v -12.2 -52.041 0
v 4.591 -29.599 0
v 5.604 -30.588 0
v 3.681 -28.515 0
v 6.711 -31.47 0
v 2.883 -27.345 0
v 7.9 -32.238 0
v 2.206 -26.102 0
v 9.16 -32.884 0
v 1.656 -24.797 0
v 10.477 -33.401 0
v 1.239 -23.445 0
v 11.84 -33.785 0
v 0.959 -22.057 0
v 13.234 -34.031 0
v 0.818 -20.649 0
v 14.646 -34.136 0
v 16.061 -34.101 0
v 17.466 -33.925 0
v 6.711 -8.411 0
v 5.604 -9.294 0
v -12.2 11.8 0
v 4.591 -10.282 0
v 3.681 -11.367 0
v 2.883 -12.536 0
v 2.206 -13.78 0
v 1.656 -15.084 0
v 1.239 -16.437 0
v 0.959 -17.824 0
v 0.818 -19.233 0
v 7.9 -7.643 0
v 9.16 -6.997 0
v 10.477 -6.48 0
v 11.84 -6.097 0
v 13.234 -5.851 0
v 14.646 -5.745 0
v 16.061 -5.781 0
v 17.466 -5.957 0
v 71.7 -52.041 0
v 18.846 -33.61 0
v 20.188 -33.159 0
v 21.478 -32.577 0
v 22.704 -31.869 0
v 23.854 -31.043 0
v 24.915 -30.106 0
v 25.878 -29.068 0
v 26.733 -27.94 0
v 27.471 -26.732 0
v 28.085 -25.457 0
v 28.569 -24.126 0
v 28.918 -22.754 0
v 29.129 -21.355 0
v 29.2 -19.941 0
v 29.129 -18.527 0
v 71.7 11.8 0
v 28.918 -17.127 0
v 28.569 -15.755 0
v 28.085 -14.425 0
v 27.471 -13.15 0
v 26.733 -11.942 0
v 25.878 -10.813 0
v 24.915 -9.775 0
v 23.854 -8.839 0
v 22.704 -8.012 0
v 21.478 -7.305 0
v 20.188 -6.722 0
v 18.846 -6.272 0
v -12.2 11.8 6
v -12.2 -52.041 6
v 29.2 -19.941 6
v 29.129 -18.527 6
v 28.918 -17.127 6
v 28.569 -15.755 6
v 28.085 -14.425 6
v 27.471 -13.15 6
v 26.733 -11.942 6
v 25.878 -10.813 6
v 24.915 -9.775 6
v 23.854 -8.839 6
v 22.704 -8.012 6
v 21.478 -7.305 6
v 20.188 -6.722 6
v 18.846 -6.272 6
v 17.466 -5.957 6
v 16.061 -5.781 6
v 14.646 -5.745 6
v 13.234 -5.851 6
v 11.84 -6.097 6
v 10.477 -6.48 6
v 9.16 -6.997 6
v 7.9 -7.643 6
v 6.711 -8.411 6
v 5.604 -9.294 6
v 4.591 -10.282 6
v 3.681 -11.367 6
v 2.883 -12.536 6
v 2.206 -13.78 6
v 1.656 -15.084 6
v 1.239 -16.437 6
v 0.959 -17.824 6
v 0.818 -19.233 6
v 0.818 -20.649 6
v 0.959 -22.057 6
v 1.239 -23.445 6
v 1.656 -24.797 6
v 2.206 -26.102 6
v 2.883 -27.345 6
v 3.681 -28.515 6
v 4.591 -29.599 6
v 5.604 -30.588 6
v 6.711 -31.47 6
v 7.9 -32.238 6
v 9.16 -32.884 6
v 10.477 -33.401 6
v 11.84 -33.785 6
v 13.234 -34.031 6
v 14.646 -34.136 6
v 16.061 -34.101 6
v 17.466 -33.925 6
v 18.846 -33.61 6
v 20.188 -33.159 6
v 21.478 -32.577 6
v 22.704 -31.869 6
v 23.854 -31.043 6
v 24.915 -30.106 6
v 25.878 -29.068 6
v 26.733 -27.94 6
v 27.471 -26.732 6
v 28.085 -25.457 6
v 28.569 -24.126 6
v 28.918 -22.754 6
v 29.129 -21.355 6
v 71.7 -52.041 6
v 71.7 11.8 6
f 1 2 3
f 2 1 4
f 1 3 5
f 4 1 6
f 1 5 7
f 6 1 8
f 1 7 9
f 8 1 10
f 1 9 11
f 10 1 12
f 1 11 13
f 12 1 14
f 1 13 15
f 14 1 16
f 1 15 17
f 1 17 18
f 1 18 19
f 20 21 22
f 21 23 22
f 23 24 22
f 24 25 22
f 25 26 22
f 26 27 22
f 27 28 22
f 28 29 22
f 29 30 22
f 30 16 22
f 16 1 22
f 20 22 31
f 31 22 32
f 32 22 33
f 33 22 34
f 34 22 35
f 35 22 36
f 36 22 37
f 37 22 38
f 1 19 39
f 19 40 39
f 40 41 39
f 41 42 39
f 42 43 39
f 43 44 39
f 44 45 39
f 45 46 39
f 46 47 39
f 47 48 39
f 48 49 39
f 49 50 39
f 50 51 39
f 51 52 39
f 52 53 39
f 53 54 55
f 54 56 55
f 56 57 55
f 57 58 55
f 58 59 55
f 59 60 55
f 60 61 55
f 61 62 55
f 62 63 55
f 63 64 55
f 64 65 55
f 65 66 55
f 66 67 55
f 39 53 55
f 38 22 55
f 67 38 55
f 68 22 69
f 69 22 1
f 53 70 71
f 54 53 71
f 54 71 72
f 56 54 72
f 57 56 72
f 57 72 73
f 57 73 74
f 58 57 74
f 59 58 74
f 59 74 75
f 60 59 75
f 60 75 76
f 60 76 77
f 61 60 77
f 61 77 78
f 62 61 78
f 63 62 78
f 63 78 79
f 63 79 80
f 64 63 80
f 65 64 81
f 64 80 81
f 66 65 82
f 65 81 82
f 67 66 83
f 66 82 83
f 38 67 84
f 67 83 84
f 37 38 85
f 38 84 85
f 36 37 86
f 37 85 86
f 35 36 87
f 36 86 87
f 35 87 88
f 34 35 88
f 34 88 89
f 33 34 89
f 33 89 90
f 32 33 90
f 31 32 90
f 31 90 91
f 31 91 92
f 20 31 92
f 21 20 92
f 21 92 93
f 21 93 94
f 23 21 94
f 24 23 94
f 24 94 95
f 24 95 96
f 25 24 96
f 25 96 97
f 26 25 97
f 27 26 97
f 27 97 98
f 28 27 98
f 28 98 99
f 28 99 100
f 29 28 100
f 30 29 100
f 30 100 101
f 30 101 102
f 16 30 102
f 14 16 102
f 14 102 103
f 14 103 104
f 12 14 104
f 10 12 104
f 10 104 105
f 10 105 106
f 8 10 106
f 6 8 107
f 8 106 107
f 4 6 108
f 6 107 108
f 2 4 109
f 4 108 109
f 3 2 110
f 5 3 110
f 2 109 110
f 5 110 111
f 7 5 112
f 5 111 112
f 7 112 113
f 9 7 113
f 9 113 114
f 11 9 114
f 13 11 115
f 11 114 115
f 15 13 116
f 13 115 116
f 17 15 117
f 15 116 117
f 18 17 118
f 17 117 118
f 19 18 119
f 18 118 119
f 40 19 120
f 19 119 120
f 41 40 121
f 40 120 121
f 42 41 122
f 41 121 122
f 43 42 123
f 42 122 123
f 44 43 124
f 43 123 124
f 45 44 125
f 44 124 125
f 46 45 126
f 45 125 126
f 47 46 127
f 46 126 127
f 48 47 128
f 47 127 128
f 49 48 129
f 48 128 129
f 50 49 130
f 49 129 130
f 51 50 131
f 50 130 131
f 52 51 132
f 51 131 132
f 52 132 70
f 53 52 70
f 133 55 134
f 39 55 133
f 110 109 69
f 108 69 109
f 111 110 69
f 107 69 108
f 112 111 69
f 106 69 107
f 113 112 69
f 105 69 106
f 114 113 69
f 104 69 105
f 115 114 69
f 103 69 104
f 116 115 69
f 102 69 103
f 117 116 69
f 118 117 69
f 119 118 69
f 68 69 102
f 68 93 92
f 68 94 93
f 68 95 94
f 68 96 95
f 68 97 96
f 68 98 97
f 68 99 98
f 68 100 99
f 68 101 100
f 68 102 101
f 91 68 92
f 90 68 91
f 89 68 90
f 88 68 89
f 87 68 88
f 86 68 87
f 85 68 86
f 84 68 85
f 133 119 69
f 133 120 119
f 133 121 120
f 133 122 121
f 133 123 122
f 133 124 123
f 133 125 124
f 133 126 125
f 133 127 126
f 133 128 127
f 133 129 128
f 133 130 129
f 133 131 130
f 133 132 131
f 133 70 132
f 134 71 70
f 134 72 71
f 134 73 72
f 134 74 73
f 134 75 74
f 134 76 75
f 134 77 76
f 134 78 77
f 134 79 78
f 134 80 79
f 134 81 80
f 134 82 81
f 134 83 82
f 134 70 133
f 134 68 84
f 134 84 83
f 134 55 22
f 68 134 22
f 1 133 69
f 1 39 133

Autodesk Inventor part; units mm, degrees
ref_plane "YZ Plane" through (0, 0, 0) normal (1, 0, 0) x (0, 1, 0)
ref_plane "XZ Plane" through (0, 0, 0) normal (0, 1, 0) x (-1, 0, 0)
ref_plane "XY Plane" through (0, 0, 0) normal (0, 0, 1) x (1, 0, 0)
sketch "스케치1" plane through (0, 0, 0) normal (0, 0, 1) x (1, 0, 0)
  line L0 (-12.2, 0) -> (71.7, 0) projected
  line L1 (71.7, 5.8) -> (71.7, 0) projected
  line L2 (-12.2, 5.8) -> (71.7, 5.8) projected
  line L3 (-12.2, 5.8) -> (-12.2, 0) projected
  line L4 (-12.2, 5.8) -> (71.7, 5.8)
  line L5 (71.7, 5.8) -> (71.7, 11.8)
  line L6 (71.7, 11.8) -> (-12.2, 11.8)
  line L7 (-12.2, 11.8) -> (-12.2, 5.8)
  line L8 (-12.2, -46.0408) -> (71.7, -46.0408) projected
  line L9 (71.7, -40.2408) -> (71.7, -46.0408) projected
  line L10 (-12.2, -40.2408) -> (71.7, -40.2408) projected
  line L11 (-12.2, -40.2408) -> (-12.2, -46.0408) projected
  line L12 (-12.2, -46.0408) -> (71.7, -46.0408)
  line L13 (71.7, -46.0408) -> (71.7, -52.0408)
  line L14 (71.7, -52.0408) -> (-12.2, -52.0408)
  line L15 (-12.2, -52.0408) -> (-12.2, -46.0408)
  line L16 (-12.2, 0) -> (71.7, 0)
  line L17 (71.7, 0) -> (71.7, -40.2408)
  line L18 (71.7, -40.2408) -> (-12.2, -40.2408)
  line L19 (-12.2, -40.2408) -> (-12.2, 0)
  point P0 (0, 0)
  dimension "d0" = 6
  dimension "d3" = 6
extrude "돌출1" add sketch "스케치1" along normal blind 6
sketch "스케치2" plane through (0, 0, 6) normal (0, 0, 1) x (1, 0, 0)
  circle A0 centre (15, -19.9408) radius 14.2
  point P0 (0, 0)
extrude "돌출2" cut sketch "스케치2" against normal blind 6
properties part number "부품72"
